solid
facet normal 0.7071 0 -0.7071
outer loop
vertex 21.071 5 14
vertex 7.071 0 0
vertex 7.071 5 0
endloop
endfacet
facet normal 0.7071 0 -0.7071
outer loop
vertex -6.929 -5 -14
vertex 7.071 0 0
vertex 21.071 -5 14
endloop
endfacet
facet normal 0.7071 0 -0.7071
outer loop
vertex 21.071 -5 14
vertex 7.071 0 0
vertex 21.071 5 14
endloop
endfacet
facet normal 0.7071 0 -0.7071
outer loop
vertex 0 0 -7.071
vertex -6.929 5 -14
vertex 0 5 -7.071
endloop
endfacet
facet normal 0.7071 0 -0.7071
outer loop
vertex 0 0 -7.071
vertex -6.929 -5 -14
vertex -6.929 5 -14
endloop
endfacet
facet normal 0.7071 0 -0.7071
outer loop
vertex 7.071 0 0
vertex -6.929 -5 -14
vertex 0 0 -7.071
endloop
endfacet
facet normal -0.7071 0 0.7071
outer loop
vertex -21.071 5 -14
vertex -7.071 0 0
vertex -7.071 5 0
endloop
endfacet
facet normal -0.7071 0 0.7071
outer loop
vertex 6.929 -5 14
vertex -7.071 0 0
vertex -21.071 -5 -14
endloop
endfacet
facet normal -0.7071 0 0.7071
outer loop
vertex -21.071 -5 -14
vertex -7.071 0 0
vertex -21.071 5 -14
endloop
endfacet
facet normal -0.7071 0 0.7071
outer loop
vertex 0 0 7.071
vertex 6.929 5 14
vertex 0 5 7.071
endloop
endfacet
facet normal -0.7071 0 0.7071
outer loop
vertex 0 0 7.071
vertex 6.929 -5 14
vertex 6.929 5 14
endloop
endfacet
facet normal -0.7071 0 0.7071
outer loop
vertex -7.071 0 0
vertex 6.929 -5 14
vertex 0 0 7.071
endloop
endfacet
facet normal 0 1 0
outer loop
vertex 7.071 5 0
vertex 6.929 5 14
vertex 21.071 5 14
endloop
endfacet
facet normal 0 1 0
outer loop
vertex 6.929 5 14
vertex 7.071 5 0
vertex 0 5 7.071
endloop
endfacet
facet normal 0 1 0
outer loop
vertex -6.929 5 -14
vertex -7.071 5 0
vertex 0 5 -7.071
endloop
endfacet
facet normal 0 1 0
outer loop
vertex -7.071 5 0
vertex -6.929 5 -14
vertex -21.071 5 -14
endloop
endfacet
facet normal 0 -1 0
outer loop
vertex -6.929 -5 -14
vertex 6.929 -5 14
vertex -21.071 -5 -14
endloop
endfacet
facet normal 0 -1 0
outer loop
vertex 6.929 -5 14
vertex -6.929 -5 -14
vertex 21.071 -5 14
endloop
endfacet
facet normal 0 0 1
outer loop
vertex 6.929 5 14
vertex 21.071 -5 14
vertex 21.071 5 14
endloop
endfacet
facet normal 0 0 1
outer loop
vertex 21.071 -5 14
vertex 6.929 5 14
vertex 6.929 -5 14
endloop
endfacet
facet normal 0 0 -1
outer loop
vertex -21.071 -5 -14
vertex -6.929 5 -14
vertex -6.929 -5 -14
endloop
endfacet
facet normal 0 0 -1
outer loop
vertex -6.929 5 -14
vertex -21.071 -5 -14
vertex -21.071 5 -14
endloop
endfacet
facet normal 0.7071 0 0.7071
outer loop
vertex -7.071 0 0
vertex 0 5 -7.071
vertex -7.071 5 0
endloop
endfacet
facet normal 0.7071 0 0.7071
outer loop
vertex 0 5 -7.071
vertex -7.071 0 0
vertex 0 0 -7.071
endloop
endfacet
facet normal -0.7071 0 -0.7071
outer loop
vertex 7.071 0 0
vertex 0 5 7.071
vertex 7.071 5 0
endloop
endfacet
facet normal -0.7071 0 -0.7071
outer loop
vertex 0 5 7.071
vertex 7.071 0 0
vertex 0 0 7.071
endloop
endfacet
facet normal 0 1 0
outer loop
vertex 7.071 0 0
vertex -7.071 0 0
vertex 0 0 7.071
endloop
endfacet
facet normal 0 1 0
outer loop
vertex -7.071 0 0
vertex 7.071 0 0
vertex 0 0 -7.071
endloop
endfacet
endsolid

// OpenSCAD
module half_x() {
    difference() {
        intersection() {
            rotate([0,45,0]) cube([10,10,50], center=true);
            cube([50,10,28], center=true);
        }
        rotate([0,-45,0]) translate([0,5,0]) cube([10,10,50], center=true);
    }
}

module x() {
    half_x();
    rotate([0,0,180]) half_x();
}
//x();


module part_x() {
    difference() {
        rotate([0,0,90]) half_x();
        x();
    }
}

// print these

half_x();
//rotate([0,0,180]) half_x();
//part_x();
//rotate([0,0,180]) part_x();
